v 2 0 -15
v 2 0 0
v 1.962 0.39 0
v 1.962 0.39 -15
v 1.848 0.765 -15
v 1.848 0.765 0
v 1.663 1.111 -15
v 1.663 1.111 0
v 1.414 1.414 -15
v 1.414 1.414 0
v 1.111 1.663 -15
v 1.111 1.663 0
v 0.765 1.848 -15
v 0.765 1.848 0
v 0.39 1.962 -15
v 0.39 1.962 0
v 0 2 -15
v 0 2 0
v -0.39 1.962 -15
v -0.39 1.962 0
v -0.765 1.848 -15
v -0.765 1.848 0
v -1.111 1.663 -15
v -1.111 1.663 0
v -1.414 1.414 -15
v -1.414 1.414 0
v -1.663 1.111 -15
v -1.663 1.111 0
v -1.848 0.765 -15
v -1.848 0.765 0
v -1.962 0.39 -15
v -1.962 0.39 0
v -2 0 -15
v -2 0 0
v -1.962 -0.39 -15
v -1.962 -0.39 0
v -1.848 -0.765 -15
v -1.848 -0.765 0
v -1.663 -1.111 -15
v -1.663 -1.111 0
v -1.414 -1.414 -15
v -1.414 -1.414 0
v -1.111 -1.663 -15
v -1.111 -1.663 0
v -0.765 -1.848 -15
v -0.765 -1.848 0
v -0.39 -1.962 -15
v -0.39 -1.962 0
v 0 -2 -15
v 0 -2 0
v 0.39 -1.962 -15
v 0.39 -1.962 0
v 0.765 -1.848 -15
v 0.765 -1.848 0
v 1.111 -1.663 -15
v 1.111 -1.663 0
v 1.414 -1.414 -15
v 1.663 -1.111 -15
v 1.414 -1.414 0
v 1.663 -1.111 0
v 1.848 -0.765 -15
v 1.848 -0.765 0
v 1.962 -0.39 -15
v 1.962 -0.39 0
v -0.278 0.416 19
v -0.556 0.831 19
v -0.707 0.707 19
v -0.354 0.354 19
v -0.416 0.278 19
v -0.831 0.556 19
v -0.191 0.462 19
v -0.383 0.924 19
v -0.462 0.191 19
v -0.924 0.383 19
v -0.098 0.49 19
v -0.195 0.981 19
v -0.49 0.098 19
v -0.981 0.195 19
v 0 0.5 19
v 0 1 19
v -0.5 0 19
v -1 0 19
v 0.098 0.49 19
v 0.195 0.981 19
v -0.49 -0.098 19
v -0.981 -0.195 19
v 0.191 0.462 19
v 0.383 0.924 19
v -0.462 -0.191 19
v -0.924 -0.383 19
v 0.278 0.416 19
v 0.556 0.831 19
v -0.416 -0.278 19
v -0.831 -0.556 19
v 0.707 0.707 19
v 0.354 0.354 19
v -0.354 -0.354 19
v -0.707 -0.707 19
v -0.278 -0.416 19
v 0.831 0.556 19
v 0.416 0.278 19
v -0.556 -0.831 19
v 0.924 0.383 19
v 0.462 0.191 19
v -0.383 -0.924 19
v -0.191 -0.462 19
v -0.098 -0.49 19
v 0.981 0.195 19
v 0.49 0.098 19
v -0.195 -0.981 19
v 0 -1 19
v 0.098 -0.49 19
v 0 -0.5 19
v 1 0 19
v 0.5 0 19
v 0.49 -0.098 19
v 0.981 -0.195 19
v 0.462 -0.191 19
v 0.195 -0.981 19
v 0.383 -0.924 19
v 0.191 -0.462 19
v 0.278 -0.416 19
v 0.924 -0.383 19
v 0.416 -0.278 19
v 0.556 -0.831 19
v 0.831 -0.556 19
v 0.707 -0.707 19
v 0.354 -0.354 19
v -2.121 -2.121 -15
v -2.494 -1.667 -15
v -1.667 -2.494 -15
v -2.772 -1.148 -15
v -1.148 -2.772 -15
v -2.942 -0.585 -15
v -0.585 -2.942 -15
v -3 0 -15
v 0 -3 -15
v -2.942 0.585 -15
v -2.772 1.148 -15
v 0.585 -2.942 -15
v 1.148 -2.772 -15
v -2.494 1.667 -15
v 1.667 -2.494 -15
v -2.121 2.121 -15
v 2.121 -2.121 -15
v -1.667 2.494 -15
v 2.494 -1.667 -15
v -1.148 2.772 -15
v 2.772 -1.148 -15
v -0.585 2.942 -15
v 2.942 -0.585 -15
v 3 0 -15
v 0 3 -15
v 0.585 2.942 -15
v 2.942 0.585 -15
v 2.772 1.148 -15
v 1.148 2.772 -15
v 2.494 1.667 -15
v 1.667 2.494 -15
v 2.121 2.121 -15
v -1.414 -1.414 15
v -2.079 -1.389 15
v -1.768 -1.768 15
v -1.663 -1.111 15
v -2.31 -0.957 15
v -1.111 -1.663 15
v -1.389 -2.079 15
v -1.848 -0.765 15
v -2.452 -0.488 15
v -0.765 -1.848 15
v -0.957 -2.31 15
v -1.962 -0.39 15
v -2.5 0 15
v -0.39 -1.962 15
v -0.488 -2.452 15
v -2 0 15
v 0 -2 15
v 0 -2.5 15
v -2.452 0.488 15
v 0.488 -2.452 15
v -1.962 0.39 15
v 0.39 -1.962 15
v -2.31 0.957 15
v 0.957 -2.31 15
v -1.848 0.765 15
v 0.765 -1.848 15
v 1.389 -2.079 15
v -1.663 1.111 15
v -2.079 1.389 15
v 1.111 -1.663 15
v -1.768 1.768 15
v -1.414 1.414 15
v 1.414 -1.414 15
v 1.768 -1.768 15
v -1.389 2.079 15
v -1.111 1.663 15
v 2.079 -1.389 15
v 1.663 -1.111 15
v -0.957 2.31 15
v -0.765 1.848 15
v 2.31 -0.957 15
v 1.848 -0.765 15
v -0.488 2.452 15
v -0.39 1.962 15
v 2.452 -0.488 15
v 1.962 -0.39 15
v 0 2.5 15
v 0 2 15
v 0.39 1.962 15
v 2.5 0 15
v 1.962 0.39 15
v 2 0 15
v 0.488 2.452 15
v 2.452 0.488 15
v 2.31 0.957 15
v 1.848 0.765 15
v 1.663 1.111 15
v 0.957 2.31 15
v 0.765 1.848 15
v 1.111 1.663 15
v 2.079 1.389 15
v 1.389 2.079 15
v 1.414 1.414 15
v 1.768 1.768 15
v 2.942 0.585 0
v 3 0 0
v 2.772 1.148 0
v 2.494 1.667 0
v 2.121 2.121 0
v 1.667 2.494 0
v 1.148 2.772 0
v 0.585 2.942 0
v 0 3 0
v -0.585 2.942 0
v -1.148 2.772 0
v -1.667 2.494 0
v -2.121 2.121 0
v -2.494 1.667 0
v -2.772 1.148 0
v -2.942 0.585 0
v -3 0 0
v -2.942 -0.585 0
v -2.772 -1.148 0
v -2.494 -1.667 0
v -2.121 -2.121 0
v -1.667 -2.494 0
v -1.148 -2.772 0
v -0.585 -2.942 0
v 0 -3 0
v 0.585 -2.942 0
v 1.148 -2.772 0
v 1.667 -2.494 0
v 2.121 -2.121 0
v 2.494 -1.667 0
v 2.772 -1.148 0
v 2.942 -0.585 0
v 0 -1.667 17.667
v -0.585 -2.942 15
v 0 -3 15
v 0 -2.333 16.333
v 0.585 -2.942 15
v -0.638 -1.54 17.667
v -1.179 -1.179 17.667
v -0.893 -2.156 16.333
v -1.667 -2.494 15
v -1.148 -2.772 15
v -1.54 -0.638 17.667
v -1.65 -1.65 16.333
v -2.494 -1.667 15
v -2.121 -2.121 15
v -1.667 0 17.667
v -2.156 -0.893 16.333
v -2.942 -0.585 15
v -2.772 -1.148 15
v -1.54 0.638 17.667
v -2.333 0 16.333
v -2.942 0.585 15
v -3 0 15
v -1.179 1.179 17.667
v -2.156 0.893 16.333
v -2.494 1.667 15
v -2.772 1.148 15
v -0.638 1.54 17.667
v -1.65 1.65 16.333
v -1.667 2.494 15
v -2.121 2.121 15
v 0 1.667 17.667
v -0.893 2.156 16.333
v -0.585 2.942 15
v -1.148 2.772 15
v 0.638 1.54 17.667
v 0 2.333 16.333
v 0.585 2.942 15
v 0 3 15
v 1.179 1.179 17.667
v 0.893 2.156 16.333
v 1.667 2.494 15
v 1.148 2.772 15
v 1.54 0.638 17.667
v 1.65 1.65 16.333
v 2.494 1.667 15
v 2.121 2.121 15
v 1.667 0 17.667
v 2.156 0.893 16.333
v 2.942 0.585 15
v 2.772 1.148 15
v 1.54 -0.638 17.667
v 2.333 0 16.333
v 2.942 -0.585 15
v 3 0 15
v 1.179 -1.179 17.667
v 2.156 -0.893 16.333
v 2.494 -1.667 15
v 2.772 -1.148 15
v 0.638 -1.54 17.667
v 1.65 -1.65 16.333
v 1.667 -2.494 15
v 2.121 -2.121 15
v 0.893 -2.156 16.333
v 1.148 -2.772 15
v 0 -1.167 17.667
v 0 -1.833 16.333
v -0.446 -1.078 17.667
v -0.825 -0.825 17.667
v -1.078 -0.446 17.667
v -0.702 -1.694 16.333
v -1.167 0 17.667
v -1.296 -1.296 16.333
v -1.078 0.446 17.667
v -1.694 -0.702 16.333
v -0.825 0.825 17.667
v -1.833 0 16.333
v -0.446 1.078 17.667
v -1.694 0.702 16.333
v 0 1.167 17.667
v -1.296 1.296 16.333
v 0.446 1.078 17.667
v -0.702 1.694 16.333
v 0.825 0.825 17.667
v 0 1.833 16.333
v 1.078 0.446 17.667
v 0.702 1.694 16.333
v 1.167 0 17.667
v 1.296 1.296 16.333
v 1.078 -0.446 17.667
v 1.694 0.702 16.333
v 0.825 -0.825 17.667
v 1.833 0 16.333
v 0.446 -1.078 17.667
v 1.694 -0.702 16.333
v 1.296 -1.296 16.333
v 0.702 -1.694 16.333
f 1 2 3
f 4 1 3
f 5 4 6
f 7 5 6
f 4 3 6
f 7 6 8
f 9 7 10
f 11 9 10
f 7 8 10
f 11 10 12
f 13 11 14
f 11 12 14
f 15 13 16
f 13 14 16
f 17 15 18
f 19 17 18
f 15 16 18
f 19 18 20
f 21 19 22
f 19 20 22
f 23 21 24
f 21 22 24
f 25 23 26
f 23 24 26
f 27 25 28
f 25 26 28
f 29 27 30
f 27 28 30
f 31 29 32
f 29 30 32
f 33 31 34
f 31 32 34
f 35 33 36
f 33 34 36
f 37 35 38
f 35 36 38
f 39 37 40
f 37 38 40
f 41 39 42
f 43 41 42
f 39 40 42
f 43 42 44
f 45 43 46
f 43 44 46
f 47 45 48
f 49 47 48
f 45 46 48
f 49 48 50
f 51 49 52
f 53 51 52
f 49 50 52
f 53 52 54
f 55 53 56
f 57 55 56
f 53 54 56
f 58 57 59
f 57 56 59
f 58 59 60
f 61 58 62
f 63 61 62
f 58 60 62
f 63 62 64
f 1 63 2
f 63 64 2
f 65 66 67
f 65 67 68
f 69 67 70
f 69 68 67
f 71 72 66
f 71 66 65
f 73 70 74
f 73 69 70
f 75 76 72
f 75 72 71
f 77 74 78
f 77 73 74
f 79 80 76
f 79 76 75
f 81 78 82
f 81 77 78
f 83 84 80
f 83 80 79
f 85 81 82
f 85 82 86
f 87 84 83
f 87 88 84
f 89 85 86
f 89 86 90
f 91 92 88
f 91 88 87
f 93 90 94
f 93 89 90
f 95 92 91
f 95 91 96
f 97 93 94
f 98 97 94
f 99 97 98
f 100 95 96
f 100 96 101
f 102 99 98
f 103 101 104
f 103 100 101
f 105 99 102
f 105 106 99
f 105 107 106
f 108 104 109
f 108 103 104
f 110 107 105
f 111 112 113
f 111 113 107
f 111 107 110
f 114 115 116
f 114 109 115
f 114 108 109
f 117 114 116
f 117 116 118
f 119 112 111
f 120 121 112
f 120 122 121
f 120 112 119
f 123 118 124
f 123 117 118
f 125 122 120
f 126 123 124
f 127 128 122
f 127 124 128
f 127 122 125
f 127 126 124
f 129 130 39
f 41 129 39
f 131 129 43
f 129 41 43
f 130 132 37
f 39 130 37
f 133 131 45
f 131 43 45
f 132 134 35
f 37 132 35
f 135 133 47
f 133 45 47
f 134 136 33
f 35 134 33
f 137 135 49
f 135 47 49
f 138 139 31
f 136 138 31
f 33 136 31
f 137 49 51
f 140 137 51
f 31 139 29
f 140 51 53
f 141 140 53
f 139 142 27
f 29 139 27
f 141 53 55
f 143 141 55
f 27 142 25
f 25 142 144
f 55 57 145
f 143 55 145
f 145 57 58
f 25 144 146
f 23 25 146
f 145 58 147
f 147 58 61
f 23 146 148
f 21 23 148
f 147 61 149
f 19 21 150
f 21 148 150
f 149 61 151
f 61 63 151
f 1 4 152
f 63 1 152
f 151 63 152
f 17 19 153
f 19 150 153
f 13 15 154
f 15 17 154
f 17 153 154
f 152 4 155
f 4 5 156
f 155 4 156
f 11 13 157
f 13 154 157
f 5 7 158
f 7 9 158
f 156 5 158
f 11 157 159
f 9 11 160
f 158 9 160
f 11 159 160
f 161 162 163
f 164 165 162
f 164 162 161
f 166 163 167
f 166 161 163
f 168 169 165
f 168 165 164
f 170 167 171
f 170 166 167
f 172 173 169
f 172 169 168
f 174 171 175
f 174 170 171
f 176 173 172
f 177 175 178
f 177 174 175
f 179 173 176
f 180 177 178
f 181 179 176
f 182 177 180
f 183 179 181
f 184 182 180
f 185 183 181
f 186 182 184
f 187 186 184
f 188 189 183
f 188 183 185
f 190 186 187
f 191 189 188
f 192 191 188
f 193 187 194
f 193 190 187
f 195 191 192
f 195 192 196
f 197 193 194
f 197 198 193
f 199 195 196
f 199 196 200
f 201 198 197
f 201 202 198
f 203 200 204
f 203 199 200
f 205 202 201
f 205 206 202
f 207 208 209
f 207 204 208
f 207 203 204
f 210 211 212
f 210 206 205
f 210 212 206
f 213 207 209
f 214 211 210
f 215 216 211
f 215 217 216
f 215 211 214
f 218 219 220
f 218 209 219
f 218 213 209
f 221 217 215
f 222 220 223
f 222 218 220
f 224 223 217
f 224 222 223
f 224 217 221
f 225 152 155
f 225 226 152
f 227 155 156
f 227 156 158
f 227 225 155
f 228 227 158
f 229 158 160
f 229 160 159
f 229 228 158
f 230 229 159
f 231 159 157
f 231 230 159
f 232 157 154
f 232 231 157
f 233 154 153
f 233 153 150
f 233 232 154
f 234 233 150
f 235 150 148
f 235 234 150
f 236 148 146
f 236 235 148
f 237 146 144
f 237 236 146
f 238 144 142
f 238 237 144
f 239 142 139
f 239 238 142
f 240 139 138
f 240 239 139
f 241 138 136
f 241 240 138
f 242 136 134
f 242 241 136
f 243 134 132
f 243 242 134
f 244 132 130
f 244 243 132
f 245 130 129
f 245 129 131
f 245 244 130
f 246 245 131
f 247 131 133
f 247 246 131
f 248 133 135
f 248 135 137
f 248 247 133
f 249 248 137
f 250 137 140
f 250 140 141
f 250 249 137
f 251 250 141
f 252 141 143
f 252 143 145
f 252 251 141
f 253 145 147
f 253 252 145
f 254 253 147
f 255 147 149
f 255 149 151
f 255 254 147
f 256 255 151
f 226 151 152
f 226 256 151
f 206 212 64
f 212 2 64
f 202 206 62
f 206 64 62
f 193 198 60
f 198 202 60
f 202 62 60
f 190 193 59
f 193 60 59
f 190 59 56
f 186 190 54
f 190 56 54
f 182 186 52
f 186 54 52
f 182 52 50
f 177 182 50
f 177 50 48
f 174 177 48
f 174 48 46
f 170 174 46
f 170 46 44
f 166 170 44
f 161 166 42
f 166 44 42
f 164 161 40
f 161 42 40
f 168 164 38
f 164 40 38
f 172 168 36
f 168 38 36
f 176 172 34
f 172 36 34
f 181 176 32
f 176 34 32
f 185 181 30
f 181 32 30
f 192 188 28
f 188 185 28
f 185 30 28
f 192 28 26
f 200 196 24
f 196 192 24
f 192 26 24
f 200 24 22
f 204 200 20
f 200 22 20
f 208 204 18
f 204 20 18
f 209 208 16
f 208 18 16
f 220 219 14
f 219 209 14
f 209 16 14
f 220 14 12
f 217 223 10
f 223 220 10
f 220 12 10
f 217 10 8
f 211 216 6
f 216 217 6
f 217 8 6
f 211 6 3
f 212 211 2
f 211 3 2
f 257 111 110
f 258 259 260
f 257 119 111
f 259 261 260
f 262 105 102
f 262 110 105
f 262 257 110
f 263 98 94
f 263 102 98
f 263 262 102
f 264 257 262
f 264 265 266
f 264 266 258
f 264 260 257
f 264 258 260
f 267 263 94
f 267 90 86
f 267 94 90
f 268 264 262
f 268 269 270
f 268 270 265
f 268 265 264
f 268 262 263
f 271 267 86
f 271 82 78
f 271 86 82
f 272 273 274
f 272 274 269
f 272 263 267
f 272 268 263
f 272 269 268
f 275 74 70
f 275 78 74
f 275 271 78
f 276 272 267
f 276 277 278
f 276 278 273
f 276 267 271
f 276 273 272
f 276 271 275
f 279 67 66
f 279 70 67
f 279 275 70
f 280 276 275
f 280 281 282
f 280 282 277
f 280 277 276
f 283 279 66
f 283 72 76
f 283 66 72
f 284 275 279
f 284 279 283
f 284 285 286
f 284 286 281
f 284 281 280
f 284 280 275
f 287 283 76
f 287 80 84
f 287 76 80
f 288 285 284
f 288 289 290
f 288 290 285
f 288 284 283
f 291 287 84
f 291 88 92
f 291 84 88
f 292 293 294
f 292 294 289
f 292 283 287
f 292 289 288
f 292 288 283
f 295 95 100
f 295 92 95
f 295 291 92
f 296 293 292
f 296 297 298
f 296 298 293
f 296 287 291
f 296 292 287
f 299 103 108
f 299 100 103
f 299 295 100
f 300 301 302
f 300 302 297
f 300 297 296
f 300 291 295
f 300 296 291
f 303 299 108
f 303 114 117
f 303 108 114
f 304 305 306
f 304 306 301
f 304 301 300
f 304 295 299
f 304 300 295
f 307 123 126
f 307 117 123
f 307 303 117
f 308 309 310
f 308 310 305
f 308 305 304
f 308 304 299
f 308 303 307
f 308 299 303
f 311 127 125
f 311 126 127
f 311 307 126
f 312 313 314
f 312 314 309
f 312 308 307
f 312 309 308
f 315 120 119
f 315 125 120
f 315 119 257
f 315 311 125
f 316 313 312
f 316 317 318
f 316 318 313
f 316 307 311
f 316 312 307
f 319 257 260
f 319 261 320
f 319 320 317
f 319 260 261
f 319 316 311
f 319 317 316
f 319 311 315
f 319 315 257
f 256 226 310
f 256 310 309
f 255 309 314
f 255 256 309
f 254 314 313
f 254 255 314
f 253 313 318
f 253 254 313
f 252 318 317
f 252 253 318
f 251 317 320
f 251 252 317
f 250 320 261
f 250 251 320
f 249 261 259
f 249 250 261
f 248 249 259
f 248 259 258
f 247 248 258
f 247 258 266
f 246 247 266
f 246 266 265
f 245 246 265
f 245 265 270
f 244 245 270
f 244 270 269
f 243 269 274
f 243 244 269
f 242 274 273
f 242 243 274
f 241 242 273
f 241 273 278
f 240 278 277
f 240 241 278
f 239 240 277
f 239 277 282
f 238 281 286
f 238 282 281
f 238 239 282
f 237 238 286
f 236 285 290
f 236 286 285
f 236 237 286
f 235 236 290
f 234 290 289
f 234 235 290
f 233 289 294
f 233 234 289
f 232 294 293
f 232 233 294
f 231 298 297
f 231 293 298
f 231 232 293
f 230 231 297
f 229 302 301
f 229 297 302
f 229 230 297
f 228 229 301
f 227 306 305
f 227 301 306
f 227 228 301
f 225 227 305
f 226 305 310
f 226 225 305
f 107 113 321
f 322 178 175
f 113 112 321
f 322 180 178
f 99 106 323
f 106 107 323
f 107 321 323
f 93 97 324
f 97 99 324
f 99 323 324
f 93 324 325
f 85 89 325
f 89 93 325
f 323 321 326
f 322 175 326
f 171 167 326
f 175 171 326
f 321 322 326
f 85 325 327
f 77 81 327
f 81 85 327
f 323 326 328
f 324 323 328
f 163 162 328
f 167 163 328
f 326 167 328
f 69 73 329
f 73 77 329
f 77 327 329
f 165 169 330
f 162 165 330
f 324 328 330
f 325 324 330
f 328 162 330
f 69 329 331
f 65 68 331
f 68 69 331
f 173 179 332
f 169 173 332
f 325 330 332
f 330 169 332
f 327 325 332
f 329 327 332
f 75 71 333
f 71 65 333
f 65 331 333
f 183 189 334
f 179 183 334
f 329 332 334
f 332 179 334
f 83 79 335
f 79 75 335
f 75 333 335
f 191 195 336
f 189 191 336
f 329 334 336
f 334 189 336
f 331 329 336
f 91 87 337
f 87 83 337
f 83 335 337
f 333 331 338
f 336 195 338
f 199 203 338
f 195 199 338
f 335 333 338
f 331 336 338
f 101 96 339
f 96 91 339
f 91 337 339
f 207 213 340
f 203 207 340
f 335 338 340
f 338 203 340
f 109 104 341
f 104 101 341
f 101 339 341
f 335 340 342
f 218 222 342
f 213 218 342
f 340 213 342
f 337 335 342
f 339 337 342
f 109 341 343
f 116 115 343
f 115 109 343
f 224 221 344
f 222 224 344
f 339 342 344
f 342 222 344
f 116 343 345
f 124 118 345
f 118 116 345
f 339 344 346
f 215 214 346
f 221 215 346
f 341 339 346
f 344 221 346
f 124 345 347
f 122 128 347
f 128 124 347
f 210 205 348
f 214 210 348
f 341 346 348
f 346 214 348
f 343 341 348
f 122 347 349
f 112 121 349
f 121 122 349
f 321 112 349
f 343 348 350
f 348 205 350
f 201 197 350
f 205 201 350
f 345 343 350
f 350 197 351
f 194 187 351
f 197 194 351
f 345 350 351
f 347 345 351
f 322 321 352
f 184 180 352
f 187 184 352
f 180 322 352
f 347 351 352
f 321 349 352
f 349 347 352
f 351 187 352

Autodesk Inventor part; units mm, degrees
ref_plane "YZ Plane" through (0, 0, 0) normal (1, 0, 0) x (0, 1, 0)
ref_plane "XZ Plane" through (0, 0, 0) normal (0, 1, 0) x (-1, 0, 0)
ref_plane "XY Plane" through (0, 0, 0) normal (0, 0, 1) x (1, 0, 0)
sketch "Sketch1" plane through (0, 0, 0) normal (0, 0, 1) x (1, 0, 0)
  circle A0 centre (0, 0) radius 3
  circle A1 centre (0, 0) radius 2
  dimension "d0" = 6
  dimension "d1" = 4
extrude "Extrusion1" add sketch "Sketch1" along normal mid plane 30
sketch "Sketch2" plane through (0, 0, 0) normal (1, 0, 0) x (0, 1, 0)
  line L0 (3, 15) -> (-3, 15) construction
  line L1 (0, 15) -> (0, 19) construction
  line L2 (-3, -15) -> (-3, 15) construction
  line L3 (-3, 15) -> (-1, 19)
  line L4 (-1, 19) -> (-0.5, 19)
  line L5 (-0.5, 19) -> (-2.5, 15)
  line L6 (-3, 15) -> (-2.5, 15)
  point P0 (0, 0)
  point P1 (-0.75, 19)
  dimension "d4" = 4
  dimension "d9" = 2
  dimension "d10" = 1
revolve "Revolution1" add sketch "Sketch2" angle 360 about axis through (0, 0, 15) along (0, 0, 1)
properties part number "Nozzle"
